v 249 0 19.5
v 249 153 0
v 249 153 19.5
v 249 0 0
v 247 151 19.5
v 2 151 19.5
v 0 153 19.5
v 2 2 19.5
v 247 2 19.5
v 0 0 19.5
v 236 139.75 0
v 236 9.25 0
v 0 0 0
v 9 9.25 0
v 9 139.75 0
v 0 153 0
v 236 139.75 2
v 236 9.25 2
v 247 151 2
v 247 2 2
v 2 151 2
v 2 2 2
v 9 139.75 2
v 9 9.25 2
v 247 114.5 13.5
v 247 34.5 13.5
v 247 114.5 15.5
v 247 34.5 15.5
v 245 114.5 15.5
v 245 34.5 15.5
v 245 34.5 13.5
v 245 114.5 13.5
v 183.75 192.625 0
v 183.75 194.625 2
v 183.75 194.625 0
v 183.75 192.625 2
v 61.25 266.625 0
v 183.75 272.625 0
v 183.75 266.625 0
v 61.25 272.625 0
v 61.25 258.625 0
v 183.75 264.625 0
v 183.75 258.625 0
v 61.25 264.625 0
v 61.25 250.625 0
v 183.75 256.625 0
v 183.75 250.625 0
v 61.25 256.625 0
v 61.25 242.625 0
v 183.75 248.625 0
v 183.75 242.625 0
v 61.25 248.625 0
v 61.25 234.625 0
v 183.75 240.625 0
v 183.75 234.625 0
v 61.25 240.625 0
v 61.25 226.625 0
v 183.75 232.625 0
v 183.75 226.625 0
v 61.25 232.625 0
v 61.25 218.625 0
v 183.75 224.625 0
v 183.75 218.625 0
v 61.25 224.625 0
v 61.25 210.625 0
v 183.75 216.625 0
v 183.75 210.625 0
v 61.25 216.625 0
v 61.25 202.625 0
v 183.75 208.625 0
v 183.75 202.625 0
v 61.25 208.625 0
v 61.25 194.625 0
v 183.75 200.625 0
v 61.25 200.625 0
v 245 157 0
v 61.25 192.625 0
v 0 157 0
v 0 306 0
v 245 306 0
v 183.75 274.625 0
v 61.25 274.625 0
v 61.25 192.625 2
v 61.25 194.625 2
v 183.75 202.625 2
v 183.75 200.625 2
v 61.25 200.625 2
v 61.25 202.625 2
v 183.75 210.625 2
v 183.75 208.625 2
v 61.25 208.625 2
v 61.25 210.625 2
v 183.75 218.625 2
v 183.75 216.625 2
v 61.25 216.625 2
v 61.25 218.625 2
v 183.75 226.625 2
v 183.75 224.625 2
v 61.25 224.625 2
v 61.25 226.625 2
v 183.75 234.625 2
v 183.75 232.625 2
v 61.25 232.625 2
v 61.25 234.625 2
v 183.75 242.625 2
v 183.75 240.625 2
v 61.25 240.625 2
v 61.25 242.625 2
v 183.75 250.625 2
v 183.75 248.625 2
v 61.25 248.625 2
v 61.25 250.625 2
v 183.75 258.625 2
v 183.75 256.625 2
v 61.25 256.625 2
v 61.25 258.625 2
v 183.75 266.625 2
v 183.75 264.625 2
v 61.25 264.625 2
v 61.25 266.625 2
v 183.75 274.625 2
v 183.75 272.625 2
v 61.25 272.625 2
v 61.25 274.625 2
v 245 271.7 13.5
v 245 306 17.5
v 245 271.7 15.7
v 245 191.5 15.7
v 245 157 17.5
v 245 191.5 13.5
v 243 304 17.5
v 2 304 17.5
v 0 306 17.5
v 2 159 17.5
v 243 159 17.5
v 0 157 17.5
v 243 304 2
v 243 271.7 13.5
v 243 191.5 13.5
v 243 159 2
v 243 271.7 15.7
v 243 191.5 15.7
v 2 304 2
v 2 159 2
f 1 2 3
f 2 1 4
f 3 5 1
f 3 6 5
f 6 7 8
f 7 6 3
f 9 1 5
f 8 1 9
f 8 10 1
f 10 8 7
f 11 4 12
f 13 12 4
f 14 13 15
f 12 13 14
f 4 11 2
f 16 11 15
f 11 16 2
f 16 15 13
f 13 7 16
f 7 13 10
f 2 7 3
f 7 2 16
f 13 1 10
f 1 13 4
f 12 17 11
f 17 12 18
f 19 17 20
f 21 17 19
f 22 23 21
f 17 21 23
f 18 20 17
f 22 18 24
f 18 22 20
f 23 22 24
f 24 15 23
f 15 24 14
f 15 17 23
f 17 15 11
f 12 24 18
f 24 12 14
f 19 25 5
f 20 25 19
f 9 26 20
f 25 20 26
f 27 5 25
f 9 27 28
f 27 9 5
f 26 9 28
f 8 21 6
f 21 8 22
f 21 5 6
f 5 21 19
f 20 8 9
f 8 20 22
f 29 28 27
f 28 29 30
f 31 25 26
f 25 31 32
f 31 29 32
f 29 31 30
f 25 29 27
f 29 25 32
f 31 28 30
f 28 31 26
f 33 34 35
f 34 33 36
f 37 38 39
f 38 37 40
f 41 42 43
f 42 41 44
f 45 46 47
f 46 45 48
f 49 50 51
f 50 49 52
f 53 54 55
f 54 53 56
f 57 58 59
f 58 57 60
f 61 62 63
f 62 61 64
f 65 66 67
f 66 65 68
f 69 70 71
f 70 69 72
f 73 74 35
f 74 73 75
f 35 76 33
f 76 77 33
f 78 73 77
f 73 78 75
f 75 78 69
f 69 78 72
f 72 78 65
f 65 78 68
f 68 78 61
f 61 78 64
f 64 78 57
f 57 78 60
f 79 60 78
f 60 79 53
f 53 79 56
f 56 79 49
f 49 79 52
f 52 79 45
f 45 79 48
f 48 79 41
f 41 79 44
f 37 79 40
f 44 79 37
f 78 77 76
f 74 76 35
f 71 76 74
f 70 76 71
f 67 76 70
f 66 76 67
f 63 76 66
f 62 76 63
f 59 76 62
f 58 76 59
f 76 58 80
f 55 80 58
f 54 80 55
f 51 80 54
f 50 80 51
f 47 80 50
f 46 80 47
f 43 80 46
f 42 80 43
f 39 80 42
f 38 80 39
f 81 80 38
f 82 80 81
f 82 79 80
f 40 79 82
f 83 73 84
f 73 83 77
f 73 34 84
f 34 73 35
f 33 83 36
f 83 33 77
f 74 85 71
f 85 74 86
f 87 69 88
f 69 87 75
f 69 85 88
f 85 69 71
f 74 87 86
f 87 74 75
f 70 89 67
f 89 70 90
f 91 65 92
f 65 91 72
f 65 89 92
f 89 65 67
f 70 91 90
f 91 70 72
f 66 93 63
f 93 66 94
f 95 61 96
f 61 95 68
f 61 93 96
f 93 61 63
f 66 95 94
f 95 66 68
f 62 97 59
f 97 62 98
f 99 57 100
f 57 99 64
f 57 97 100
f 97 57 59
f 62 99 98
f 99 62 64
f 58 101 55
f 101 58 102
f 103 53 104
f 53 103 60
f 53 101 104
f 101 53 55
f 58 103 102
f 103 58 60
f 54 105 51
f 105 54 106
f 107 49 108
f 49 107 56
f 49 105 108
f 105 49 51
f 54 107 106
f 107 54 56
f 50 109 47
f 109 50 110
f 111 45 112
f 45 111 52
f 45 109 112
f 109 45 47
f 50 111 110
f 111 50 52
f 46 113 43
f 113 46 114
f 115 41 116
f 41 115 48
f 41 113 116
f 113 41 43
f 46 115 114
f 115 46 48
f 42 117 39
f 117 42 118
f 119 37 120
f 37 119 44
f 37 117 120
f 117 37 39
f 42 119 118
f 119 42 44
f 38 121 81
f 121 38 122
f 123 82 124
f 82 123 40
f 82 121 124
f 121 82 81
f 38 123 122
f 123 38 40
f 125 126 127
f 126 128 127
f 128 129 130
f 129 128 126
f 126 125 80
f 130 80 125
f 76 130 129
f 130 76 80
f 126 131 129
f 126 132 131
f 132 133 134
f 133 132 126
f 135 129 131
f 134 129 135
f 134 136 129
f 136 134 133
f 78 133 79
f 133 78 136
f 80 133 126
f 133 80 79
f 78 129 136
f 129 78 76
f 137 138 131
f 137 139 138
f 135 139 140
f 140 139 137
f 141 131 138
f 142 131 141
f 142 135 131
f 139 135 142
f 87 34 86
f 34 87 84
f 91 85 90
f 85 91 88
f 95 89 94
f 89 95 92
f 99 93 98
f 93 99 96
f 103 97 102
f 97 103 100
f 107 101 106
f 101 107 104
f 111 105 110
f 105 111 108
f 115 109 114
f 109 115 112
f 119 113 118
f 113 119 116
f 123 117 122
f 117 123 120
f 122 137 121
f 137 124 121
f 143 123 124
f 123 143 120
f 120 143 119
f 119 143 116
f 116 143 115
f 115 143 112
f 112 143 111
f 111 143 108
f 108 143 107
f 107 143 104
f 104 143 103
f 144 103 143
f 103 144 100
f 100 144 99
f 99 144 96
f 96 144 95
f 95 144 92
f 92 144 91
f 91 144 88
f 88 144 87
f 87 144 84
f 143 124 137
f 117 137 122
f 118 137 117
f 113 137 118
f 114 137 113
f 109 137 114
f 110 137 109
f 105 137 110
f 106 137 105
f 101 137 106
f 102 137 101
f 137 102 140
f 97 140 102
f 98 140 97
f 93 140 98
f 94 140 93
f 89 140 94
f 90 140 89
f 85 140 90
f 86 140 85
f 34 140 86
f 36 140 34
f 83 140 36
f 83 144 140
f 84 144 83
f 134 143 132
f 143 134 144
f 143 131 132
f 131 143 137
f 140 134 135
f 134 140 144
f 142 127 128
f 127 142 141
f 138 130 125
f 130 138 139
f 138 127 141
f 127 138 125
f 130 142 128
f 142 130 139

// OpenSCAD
/*
 * Tablet frame - wall mount
 * (c) 2020 David Mikulik
 * Licensed under 
 *   Creative Commons 
 *   Attribution Non Comercial Share alike license
 */


//$fn=100;
THIKNES=2;

EXTERNAL_WIDTH=245;
EXTERNAL_HEIGHT=149;
DEPTH=7.5+10;

WINDOW_WIDTH=227;
WINDOW_HEIGHT=130.5;

WITH_COVER=1;
WITH_BACK=1;
WITH_LOGO=1;


if (WITH_COVER) cover();
if (WITH_BACK) {
    translate ([0,EXTERNAL_HEIGHT+THIKNES*4,0]) {
        back();
    }
}
     
module back () {
    difference () {
        cube ([EXTERNAL_WIDTH, EXTERNAL_HEIGHT, DEPTH]);
        translate ([THIKNES,THIKNES,THIKNES]) {
            cube ([EXTERNAL_WIDTH-THIKNES*2, EXTERNAL_HEIGHT-THIKNES*2, DEPTH-THIKNES]);
        }
    translate ([(EXTERNAL_WIDTH-2),(EXTERNAL_HEIGHT/2-40),DEPTH-4     ]) {
        clip(true);
    }
    vent ();

    }
    
}

module cover () {
    difference () {
        cube ([EXTERNAL_WIDTH+THIKNES*2, EXTERNAL_HEIGHT+THIKNES*2, DEPTH+THIKNES]);
        translate ([(EXTERNAL_WIDTH-WINDOW_WIDTH)/2,(EXTERNAL_HEIGHT-WINDOW_HEIGHT)/2,0]) {
            cube ([WINDOW_WIDTH, WINDOW_HEIGHT, THIKNES]);
        }
        translate ([THIKNES,THIKNES,THIKNES]) {
            cube ([EXTERNAL_WIDTH, EXTERNAL_HEIGHT, DEPTH]);
        }
    if (WITH_LOGO)
    translate ([(EXTERNAL_WIDTH-20)/2,(EXTERNAL_HEIGHT-0),-1]) {
        rotate ([180,0,0]) {
            scale([.1,.1,.02]) {
                surface(file="Atos-logo-220x165.png",invert=true);
            }
        }
    }
    }
    translate ([(EXTERNAL_WIDTH),(EXTERNAL_HEIGHT/2-40),DEPTH-4]) {
        clip(false);
    }
}

module vent () {
        translate ([0,EXTERNAL_WIDTH/8,0]) {
        for (i=[0:10]) {
            move =0;
            
            translate([EXTERNAL_WIDTH/4,i*8+5, move]){
                cube([EXTERNAL_WIDTH-EXTERNAL_WIDTH/2,2, THIKNES*2]);               
            }            
        }
    }
}
module clip(hole) {
    x=3;
    y=80;
    z=2;
    if (hole) {
        x=x+0.2;
        y=y+0.2;
        z=z+0.2;
    cube ([x, y, z]);
    }
    else {
        cube ([x, y, z]);
    }
}
